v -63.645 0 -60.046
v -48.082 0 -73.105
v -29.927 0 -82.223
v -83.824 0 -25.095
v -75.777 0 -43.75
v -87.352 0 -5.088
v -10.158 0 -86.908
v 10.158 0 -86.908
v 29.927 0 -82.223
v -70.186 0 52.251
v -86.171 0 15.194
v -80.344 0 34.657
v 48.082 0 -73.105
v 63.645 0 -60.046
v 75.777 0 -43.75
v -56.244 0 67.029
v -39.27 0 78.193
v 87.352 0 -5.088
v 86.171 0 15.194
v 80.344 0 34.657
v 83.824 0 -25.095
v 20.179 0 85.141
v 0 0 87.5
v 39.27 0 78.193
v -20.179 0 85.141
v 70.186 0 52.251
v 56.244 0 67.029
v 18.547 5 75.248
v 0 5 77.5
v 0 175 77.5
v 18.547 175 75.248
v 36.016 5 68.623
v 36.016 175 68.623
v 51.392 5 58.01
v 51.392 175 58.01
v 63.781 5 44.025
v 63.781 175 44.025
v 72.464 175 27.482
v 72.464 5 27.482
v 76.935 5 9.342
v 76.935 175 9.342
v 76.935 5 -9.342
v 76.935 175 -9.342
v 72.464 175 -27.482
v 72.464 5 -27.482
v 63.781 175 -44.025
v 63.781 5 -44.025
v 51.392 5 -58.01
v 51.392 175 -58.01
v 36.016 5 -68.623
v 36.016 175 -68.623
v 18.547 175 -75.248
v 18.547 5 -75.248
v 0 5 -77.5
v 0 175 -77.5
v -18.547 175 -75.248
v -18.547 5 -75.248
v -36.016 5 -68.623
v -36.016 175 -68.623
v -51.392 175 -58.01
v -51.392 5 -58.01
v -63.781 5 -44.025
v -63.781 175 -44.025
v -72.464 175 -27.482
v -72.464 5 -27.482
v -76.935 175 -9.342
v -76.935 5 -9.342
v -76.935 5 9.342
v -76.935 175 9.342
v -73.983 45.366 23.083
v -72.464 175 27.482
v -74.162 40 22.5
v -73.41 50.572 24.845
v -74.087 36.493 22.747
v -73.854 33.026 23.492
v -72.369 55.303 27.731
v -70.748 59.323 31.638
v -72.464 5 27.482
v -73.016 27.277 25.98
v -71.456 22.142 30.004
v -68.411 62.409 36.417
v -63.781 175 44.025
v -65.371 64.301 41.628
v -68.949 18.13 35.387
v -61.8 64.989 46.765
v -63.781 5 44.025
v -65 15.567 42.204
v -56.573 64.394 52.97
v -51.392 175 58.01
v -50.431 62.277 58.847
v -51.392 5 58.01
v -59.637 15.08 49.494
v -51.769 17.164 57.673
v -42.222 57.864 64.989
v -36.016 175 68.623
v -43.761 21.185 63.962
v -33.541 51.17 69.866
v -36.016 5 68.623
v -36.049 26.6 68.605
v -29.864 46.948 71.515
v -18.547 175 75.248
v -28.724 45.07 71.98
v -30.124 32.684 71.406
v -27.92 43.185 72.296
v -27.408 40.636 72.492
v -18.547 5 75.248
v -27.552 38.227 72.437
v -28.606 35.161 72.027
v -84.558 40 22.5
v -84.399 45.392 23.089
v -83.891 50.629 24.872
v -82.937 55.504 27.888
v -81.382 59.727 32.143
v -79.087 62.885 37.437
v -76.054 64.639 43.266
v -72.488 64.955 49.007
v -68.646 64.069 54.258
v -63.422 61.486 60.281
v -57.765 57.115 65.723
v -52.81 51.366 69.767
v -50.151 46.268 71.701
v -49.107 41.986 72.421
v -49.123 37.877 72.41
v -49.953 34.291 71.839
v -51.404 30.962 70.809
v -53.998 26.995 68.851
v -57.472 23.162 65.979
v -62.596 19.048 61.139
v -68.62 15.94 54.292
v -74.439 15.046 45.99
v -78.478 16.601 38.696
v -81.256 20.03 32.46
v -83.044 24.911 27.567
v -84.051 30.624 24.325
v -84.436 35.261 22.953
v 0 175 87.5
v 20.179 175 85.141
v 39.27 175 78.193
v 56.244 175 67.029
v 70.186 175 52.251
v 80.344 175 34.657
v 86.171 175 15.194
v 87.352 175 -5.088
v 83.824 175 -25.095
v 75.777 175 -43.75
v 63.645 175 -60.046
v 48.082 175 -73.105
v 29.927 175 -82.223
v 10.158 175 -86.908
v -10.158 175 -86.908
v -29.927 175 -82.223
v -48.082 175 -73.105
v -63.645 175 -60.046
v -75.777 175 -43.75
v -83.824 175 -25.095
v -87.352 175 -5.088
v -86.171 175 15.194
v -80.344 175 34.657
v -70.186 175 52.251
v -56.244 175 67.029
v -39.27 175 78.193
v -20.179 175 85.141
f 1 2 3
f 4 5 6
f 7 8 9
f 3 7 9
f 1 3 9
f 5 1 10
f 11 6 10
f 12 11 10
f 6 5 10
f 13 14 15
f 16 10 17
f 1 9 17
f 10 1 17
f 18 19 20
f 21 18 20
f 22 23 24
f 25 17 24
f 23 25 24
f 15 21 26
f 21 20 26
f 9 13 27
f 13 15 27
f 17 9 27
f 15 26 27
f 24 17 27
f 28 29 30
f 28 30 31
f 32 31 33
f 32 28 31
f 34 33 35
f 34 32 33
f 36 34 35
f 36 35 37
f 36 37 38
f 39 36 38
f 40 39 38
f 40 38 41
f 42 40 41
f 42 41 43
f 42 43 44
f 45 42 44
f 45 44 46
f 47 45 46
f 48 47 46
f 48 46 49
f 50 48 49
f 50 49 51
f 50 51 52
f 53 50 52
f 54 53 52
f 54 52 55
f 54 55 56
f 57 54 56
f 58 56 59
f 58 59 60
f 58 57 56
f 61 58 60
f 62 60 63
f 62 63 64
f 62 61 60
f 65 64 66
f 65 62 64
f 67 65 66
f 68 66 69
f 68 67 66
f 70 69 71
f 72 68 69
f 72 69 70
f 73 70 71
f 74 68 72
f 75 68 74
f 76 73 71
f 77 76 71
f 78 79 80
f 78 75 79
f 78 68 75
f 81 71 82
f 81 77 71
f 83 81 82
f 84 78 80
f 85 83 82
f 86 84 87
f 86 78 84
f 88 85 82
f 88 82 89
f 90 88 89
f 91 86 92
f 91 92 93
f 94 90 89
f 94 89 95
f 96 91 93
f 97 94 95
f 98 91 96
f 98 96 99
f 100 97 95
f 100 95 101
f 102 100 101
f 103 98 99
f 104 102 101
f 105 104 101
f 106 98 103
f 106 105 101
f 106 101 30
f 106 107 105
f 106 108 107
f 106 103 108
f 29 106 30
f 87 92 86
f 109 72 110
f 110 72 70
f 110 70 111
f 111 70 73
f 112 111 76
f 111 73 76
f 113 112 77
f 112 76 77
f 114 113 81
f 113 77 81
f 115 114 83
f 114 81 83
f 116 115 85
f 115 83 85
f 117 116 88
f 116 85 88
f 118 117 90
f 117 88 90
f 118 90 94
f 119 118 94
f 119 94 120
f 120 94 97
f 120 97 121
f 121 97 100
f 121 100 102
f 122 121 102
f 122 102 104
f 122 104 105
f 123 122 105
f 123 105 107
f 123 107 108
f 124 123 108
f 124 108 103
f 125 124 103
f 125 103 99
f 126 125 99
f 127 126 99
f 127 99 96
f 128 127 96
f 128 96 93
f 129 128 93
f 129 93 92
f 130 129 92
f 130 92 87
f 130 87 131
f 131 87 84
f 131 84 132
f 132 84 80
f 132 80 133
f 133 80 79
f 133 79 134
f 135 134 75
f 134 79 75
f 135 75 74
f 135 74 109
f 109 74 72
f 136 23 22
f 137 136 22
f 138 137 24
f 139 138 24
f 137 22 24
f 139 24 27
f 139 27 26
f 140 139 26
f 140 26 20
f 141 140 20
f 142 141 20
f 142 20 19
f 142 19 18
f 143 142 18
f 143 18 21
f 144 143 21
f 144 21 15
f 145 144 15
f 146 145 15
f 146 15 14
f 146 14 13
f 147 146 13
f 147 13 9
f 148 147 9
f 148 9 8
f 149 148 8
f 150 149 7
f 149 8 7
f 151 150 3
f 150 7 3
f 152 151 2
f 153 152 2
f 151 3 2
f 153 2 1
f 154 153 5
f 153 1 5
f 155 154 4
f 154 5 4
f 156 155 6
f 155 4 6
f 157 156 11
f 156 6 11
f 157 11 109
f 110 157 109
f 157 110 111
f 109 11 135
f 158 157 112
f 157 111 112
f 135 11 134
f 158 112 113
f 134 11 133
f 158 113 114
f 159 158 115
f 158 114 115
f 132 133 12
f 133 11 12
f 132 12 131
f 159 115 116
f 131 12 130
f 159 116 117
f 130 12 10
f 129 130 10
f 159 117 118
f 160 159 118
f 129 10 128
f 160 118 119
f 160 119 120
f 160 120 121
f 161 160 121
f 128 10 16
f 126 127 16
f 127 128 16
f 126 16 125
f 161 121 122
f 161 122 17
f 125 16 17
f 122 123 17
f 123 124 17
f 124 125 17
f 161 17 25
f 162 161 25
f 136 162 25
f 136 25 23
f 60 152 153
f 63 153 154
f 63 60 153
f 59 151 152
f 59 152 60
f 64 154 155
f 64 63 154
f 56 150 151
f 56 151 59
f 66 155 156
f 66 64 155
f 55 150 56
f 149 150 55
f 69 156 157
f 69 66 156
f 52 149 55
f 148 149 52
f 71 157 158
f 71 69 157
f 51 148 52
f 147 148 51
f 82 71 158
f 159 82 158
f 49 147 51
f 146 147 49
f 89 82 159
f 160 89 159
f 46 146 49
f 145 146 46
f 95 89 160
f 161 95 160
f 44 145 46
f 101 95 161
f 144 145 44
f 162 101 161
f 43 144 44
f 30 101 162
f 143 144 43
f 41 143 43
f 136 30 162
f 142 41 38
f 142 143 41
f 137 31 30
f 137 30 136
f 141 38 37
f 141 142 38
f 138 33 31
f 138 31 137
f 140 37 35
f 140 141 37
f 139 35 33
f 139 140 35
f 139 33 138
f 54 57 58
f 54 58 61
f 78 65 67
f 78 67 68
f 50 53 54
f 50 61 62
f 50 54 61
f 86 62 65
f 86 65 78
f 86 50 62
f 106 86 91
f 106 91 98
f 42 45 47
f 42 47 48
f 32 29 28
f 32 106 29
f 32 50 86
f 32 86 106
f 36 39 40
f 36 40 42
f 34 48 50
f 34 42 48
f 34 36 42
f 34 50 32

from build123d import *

# Parameters (mm, degrees)
SKETCH3_R           = 87.5
SKETCH3_R_2         = 77.5
BOSS_EXTRUDE1_DEPTH = 175
SKETCH3_2_R         = 77.5
BOSS_EXTRUDE2_DEPTH = 5
SKETCH4_R           = 25
CUT_EXTRUDE1_DEPTH  = 215.330352494


with BuildPart() as part:
    # Sketch3 → Boss-Extrude1 (new body)
    with BuildSketch(Plane(origin=(0, 0, 0), x_dir=(1, 0, 0), z_dir=(0, 1, 0))):
        Circle(SKETCH3_R)
        Circle(SKETCH3_R_2, mode=Mode.SUBTRACT)
    extrude(amount=BOSS_EXTRUDE1_DEPTH)

    # Sketch3<2> → Boss-Extrude2 (add)
    with BuildSketch(Plane(origin=(0, 0, 0), x_dir=(1, 0, 0), z_dir=(0, 1, 0))):
        Circle(SKETCH3_2_R)
    extrude(amount=BOSS_EXTRUDE2_DEPTH)

    # Sketch4 → Cut-Extrude1 (cut, through all)
    with BuildSketch(Plane(origin=(0, 0, 0), x_dir=(0, 0, -1), z_dir=(1, 0, 0))):
        with Locations((-47.5, 40)):
            Circle(SKETCH4_R)
    extrude(amount=-CUT_EXTRUDE1_DEPTH, mode=Mode.SUBTRACT)


solid = part.part
